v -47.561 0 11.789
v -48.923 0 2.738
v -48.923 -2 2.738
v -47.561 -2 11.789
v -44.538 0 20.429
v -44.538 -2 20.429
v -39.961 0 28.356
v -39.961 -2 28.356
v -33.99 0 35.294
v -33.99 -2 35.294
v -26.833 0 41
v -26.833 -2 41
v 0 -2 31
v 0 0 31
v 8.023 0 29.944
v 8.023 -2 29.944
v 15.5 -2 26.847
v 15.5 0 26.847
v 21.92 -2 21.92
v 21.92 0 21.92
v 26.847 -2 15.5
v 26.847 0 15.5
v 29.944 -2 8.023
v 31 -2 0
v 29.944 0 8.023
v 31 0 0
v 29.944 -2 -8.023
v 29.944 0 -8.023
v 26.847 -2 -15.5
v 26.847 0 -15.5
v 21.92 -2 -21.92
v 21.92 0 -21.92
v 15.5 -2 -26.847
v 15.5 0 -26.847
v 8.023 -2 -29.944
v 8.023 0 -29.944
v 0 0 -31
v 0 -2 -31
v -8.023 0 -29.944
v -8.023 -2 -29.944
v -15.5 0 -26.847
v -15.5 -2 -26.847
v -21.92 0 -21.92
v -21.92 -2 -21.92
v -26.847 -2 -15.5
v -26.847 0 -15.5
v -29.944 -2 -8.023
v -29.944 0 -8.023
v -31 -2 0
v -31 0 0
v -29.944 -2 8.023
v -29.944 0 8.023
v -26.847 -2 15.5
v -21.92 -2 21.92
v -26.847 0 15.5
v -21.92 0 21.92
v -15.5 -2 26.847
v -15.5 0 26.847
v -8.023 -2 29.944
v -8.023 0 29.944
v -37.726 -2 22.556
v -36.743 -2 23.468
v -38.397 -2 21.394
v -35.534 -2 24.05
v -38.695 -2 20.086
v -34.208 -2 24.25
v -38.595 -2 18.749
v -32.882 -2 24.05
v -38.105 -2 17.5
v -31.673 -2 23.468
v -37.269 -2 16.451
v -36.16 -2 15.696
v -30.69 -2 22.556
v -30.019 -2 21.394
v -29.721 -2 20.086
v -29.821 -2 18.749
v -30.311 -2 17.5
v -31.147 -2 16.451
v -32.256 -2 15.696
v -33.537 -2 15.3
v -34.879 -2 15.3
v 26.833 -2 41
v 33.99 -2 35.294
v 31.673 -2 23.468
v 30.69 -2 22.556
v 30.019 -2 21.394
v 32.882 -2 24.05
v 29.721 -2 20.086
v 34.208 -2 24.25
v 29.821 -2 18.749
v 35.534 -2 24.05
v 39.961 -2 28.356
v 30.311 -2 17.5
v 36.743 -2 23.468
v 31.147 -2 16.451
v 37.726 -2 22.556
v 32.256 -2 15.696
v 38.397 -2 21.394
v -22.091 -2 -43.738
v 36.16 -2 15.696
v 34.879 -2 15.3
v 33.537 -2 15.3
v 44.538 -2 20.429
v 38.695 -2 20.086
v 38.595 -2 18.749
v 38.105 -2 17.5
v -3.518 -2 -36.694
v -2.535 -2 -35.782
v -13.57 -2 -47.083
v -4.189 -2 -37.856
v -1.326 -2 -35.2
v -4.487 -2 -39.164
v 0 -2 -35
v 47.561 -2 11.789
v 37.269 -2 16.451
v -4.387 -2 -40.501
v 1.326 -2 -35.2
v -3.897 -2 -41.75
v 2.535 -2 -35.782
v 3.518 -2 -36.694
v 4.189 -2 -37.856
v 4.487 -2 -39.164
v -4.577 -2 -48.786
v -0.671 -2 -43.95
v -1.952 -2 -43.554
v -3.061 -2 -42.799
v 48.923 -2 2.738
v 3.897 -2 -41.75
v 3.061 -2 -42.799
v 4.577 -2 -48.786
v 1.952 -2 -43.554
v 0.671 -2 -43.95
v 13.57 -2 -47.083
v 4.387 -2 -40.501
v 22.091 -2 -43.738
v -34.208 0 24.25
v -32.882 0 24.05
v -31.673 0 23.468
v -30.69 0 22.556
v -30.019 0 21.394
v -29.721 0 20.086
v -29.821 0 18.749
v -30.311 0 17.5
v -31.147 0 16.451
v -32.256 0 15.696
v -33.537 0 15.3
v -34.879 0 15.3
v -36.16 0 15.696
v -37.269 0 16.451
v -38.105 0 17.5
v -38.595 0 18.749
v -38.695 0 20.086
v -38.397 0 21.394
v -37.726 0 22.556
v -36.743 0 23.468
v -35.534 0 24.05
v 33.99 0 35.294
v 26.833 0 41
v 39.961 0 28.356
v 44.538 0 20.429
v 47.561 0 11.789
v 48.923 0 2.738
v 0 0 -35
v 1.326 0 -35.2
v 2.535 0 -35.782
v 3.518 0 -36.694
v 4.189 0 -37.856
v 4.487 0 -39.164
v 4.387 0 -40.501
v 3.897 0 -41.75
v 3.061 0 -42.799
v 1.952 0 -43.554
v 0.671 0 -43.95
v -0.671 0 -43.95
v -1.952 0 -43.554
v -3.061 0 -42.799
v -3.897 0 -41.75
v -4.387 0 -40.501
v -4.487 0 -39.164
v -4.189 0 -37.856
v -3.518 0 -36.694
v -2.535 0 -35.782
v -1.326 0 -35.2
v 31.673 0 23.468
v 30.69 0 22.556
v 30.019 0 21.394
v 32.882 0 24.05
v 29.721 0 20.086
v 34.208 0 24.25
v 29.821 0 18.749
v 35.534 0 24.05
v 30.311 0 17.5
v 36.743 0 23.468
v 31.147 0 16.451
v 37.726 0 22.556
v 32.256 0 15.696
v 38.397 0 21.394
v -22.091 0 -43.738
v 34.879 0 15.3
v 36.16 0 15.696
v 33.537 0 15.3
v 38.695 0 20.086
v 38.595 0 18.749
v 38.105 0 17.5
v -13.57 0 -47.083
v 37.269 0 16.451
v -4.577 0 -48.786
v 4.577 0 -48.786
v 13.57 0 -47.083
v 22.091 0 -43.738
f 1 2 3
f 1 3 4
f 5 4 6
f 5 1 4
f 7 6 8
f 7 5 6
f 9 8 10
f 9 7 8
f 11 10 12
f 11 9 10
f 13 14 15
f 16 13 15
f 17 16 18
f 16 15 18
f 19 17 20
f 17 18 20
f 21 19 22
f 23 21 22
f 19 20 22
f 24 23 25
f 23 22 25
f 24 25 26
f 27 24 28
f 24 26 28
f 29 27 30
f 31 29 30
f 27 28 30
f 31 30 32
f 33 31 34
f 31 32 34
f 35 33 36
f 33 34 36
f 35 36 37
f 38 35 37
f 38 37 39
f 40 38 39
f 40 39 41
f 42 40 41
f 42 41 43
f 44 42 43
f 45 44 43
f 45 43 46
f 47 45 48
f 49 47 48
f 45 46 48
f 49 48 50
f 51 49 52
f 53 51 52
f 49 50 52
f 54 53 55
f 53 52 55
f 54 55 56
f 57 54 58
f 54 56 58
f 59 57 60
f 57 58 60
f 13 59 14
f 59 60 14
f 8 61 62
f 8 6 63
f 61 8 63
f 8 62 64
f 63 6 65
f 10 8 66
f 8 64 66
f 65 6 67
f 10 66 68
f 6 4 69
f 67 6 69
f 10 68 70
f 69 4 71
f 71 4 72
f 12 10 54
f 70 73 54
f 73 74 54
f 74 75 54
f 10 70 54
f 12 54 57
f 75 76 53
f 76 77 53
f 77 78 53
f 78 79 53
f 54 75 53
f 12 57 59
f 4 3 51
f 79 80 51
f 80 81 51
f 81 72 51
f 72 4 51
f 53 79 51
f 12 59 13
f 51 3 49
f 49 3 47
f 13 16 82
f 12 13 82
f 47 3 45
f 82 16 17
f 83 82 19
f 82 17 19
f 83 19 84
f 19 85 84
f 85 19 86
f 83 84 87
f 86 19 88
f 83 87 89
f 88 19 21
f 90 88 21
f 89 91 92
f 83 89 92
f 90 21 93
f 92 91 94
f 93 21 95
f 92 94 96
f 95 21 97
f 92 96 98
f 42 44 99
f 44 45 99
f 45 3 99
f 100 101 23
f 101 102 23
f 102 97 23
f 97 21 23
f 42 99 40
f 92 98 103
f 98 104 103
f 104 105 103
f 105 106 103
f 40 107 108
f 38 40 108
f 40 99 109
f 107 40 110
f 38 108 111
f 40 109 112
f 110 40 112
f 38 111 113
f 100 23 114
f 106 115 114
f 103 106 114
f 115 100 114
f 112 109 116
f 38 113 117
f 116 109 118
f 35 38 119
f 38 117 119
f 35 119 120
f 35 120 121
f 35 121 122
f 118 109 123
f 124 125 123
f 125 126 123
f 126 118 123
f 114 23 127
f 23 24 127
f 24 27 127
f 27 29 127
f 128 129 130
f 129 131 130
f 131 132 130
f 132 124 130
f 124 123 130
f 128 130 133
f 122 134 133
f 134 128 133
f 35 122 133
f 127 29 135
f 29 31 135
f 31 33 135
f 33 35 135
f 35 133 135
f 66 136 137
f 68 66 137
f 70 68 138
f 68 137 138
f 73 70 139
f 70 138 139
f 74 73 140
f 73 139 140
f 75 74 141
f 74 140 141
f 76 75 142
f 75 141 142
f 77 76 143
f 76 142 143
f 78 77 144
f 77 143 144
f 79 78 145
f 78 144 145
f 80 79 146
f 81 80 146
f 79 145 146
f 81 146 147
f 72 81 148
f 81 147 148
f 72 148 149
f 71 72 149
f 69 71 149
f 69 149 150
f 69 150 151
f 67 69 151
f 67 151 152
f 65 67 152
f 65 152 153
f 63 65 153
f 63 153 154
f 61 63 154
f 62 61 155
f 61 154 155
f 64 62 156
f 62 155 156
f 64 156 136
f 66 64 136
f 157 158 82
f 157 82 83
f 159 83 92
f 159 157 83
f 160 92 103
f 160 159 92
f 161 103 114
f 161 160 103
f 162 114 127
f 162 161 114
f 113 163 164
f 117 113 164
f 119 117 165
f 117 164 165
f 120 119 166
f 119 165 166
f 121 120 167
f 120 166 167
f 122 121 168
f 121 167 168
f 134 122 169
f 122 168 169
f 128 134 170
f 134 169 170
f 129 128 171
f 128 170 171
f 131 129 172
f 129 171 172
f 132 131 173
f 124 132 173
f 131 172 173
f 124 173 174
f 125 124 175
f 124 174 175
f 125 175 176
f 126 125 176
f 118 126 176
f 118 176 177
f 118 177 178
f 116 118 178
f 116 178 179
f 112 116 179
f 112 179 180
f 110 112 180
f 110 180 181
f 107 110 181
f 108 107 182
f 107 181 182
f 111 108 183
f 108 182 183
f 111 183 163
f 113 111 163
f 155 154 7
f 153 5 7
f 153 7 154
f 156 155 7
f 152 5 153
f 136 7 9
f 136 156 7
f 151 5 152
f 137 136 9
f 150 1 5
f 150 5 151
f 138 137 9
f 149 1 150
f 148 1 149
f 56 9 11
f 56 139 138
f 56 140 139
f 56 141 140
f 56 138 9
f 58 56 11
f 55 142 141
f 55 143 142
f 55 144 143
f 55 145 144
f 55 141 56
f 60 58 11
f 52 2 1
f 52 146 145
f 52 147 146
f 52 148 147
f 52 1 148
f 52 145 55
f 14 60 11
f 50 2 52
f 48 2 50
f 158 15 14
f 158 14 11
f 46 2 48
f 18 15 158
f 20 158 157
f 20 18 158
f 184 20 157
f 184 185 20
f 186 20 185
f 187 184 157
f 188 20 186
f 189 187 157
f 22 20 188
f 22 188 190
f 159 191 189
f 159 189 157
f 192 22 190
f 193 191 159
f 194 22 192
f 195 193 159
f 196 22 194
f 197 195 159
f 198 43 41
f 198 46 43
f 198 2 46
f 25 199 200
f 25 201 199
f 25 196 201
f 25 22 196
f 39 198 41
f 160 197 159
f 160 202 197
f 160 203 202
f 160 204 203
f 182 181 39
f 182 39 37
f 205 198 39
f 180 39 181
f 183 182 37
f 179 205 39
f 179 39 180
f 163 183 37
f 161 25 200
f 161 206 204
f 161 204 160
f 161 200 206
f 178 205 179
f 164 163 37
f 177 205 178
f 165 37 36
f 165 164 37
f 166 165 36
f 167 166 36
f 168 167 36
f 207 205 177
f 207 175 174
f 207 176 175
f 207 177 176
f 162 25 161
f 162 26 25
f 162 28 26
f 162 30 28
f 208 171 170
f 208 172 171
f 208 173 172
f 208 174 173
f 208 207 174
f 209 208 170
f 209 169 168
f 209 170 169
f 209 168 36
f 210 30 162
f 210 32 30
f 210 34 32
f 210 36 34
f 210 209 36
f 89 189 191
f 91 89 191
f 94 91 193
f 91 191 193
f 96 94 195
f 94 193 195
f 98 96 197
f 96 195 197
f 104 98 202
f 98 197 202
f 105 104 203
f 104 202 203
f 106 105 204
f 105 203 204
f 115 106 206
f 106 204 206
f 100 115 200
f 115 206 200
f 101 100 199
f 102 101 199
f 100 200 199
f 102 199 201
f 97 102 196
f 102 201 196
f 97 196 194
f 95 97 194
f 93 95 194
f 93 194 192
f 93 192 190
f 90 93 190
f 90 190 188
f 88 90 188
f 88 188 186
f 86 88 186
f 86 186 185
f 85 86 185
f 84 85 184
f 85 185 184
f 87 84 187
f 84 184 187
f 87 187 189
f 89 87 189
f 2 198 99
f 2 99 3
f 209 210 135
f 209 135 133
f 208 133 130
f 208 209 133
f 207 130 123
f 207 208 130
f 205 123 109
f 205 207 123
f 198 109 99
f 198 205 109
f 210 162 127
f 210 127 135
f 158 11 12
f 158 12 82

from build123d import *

# Parameters (mm, degrees)
ESBO_O1_R          = 31
ESBO_O1_R_2        = 4.5
FLANGE_BASE1_DEPTH = 2


# Sheet-metal steps are written as plain solids
with BuildPart() as part:
    # Esboço1 → Flange-base1 (new body)
    with BuildSketch(Plane(origin=(0, 0, 0), x_dir=(1, 0, 0), z_dir=(0, 1, 0))):
        with BuildLine():
            Line((-22.09063369, 43.737900077), (-48.92344942, -2.737900077))
            ThreePointArc((-48.92344942, -2.737900077), (-42.435244785, -24.5), (-26.83281573, -41))
            Line((-26.83281573, -41), (26.83281573, -41))
            ThreePointArc((26.83281573, -41), (42.435244785, -24.5), (48.92344942, -2.737900077))
            Line((48.92344942, -2.737900077), (22.09063369, 43.737900077))
            ThreePointArc((22.09063369, 43.737900077), (0, 49), (-22.09063369, 43.737900077))
        make_face()
        with Locations(Location((0, 0, 0), (0, 0, 270))):
            Circle(ESBO_O1_R, mode=Mode.SUBTRACT)
        with Locations(Location((0, 39.5, 0), (0, 0, 270))):
            Circle(ESBO_O1_R_2, mode=Mode.SUBTRACT)
        with Locations(Location((34.208003449, -19.75, 0), (0, 0, 270))):
            Circle(ESBO_O1_R_2, mode=Mode.SUBTRACT)
        with Locations(Location((-34.208003449, -19.75, 0), (0, 0, 270))):
            Circle(ESBO_O1_R_2, mode=Mode.SUBTRACT)
    extrude(amount=-FLANGE_BASE1_DEPTH)


solid = part.part
